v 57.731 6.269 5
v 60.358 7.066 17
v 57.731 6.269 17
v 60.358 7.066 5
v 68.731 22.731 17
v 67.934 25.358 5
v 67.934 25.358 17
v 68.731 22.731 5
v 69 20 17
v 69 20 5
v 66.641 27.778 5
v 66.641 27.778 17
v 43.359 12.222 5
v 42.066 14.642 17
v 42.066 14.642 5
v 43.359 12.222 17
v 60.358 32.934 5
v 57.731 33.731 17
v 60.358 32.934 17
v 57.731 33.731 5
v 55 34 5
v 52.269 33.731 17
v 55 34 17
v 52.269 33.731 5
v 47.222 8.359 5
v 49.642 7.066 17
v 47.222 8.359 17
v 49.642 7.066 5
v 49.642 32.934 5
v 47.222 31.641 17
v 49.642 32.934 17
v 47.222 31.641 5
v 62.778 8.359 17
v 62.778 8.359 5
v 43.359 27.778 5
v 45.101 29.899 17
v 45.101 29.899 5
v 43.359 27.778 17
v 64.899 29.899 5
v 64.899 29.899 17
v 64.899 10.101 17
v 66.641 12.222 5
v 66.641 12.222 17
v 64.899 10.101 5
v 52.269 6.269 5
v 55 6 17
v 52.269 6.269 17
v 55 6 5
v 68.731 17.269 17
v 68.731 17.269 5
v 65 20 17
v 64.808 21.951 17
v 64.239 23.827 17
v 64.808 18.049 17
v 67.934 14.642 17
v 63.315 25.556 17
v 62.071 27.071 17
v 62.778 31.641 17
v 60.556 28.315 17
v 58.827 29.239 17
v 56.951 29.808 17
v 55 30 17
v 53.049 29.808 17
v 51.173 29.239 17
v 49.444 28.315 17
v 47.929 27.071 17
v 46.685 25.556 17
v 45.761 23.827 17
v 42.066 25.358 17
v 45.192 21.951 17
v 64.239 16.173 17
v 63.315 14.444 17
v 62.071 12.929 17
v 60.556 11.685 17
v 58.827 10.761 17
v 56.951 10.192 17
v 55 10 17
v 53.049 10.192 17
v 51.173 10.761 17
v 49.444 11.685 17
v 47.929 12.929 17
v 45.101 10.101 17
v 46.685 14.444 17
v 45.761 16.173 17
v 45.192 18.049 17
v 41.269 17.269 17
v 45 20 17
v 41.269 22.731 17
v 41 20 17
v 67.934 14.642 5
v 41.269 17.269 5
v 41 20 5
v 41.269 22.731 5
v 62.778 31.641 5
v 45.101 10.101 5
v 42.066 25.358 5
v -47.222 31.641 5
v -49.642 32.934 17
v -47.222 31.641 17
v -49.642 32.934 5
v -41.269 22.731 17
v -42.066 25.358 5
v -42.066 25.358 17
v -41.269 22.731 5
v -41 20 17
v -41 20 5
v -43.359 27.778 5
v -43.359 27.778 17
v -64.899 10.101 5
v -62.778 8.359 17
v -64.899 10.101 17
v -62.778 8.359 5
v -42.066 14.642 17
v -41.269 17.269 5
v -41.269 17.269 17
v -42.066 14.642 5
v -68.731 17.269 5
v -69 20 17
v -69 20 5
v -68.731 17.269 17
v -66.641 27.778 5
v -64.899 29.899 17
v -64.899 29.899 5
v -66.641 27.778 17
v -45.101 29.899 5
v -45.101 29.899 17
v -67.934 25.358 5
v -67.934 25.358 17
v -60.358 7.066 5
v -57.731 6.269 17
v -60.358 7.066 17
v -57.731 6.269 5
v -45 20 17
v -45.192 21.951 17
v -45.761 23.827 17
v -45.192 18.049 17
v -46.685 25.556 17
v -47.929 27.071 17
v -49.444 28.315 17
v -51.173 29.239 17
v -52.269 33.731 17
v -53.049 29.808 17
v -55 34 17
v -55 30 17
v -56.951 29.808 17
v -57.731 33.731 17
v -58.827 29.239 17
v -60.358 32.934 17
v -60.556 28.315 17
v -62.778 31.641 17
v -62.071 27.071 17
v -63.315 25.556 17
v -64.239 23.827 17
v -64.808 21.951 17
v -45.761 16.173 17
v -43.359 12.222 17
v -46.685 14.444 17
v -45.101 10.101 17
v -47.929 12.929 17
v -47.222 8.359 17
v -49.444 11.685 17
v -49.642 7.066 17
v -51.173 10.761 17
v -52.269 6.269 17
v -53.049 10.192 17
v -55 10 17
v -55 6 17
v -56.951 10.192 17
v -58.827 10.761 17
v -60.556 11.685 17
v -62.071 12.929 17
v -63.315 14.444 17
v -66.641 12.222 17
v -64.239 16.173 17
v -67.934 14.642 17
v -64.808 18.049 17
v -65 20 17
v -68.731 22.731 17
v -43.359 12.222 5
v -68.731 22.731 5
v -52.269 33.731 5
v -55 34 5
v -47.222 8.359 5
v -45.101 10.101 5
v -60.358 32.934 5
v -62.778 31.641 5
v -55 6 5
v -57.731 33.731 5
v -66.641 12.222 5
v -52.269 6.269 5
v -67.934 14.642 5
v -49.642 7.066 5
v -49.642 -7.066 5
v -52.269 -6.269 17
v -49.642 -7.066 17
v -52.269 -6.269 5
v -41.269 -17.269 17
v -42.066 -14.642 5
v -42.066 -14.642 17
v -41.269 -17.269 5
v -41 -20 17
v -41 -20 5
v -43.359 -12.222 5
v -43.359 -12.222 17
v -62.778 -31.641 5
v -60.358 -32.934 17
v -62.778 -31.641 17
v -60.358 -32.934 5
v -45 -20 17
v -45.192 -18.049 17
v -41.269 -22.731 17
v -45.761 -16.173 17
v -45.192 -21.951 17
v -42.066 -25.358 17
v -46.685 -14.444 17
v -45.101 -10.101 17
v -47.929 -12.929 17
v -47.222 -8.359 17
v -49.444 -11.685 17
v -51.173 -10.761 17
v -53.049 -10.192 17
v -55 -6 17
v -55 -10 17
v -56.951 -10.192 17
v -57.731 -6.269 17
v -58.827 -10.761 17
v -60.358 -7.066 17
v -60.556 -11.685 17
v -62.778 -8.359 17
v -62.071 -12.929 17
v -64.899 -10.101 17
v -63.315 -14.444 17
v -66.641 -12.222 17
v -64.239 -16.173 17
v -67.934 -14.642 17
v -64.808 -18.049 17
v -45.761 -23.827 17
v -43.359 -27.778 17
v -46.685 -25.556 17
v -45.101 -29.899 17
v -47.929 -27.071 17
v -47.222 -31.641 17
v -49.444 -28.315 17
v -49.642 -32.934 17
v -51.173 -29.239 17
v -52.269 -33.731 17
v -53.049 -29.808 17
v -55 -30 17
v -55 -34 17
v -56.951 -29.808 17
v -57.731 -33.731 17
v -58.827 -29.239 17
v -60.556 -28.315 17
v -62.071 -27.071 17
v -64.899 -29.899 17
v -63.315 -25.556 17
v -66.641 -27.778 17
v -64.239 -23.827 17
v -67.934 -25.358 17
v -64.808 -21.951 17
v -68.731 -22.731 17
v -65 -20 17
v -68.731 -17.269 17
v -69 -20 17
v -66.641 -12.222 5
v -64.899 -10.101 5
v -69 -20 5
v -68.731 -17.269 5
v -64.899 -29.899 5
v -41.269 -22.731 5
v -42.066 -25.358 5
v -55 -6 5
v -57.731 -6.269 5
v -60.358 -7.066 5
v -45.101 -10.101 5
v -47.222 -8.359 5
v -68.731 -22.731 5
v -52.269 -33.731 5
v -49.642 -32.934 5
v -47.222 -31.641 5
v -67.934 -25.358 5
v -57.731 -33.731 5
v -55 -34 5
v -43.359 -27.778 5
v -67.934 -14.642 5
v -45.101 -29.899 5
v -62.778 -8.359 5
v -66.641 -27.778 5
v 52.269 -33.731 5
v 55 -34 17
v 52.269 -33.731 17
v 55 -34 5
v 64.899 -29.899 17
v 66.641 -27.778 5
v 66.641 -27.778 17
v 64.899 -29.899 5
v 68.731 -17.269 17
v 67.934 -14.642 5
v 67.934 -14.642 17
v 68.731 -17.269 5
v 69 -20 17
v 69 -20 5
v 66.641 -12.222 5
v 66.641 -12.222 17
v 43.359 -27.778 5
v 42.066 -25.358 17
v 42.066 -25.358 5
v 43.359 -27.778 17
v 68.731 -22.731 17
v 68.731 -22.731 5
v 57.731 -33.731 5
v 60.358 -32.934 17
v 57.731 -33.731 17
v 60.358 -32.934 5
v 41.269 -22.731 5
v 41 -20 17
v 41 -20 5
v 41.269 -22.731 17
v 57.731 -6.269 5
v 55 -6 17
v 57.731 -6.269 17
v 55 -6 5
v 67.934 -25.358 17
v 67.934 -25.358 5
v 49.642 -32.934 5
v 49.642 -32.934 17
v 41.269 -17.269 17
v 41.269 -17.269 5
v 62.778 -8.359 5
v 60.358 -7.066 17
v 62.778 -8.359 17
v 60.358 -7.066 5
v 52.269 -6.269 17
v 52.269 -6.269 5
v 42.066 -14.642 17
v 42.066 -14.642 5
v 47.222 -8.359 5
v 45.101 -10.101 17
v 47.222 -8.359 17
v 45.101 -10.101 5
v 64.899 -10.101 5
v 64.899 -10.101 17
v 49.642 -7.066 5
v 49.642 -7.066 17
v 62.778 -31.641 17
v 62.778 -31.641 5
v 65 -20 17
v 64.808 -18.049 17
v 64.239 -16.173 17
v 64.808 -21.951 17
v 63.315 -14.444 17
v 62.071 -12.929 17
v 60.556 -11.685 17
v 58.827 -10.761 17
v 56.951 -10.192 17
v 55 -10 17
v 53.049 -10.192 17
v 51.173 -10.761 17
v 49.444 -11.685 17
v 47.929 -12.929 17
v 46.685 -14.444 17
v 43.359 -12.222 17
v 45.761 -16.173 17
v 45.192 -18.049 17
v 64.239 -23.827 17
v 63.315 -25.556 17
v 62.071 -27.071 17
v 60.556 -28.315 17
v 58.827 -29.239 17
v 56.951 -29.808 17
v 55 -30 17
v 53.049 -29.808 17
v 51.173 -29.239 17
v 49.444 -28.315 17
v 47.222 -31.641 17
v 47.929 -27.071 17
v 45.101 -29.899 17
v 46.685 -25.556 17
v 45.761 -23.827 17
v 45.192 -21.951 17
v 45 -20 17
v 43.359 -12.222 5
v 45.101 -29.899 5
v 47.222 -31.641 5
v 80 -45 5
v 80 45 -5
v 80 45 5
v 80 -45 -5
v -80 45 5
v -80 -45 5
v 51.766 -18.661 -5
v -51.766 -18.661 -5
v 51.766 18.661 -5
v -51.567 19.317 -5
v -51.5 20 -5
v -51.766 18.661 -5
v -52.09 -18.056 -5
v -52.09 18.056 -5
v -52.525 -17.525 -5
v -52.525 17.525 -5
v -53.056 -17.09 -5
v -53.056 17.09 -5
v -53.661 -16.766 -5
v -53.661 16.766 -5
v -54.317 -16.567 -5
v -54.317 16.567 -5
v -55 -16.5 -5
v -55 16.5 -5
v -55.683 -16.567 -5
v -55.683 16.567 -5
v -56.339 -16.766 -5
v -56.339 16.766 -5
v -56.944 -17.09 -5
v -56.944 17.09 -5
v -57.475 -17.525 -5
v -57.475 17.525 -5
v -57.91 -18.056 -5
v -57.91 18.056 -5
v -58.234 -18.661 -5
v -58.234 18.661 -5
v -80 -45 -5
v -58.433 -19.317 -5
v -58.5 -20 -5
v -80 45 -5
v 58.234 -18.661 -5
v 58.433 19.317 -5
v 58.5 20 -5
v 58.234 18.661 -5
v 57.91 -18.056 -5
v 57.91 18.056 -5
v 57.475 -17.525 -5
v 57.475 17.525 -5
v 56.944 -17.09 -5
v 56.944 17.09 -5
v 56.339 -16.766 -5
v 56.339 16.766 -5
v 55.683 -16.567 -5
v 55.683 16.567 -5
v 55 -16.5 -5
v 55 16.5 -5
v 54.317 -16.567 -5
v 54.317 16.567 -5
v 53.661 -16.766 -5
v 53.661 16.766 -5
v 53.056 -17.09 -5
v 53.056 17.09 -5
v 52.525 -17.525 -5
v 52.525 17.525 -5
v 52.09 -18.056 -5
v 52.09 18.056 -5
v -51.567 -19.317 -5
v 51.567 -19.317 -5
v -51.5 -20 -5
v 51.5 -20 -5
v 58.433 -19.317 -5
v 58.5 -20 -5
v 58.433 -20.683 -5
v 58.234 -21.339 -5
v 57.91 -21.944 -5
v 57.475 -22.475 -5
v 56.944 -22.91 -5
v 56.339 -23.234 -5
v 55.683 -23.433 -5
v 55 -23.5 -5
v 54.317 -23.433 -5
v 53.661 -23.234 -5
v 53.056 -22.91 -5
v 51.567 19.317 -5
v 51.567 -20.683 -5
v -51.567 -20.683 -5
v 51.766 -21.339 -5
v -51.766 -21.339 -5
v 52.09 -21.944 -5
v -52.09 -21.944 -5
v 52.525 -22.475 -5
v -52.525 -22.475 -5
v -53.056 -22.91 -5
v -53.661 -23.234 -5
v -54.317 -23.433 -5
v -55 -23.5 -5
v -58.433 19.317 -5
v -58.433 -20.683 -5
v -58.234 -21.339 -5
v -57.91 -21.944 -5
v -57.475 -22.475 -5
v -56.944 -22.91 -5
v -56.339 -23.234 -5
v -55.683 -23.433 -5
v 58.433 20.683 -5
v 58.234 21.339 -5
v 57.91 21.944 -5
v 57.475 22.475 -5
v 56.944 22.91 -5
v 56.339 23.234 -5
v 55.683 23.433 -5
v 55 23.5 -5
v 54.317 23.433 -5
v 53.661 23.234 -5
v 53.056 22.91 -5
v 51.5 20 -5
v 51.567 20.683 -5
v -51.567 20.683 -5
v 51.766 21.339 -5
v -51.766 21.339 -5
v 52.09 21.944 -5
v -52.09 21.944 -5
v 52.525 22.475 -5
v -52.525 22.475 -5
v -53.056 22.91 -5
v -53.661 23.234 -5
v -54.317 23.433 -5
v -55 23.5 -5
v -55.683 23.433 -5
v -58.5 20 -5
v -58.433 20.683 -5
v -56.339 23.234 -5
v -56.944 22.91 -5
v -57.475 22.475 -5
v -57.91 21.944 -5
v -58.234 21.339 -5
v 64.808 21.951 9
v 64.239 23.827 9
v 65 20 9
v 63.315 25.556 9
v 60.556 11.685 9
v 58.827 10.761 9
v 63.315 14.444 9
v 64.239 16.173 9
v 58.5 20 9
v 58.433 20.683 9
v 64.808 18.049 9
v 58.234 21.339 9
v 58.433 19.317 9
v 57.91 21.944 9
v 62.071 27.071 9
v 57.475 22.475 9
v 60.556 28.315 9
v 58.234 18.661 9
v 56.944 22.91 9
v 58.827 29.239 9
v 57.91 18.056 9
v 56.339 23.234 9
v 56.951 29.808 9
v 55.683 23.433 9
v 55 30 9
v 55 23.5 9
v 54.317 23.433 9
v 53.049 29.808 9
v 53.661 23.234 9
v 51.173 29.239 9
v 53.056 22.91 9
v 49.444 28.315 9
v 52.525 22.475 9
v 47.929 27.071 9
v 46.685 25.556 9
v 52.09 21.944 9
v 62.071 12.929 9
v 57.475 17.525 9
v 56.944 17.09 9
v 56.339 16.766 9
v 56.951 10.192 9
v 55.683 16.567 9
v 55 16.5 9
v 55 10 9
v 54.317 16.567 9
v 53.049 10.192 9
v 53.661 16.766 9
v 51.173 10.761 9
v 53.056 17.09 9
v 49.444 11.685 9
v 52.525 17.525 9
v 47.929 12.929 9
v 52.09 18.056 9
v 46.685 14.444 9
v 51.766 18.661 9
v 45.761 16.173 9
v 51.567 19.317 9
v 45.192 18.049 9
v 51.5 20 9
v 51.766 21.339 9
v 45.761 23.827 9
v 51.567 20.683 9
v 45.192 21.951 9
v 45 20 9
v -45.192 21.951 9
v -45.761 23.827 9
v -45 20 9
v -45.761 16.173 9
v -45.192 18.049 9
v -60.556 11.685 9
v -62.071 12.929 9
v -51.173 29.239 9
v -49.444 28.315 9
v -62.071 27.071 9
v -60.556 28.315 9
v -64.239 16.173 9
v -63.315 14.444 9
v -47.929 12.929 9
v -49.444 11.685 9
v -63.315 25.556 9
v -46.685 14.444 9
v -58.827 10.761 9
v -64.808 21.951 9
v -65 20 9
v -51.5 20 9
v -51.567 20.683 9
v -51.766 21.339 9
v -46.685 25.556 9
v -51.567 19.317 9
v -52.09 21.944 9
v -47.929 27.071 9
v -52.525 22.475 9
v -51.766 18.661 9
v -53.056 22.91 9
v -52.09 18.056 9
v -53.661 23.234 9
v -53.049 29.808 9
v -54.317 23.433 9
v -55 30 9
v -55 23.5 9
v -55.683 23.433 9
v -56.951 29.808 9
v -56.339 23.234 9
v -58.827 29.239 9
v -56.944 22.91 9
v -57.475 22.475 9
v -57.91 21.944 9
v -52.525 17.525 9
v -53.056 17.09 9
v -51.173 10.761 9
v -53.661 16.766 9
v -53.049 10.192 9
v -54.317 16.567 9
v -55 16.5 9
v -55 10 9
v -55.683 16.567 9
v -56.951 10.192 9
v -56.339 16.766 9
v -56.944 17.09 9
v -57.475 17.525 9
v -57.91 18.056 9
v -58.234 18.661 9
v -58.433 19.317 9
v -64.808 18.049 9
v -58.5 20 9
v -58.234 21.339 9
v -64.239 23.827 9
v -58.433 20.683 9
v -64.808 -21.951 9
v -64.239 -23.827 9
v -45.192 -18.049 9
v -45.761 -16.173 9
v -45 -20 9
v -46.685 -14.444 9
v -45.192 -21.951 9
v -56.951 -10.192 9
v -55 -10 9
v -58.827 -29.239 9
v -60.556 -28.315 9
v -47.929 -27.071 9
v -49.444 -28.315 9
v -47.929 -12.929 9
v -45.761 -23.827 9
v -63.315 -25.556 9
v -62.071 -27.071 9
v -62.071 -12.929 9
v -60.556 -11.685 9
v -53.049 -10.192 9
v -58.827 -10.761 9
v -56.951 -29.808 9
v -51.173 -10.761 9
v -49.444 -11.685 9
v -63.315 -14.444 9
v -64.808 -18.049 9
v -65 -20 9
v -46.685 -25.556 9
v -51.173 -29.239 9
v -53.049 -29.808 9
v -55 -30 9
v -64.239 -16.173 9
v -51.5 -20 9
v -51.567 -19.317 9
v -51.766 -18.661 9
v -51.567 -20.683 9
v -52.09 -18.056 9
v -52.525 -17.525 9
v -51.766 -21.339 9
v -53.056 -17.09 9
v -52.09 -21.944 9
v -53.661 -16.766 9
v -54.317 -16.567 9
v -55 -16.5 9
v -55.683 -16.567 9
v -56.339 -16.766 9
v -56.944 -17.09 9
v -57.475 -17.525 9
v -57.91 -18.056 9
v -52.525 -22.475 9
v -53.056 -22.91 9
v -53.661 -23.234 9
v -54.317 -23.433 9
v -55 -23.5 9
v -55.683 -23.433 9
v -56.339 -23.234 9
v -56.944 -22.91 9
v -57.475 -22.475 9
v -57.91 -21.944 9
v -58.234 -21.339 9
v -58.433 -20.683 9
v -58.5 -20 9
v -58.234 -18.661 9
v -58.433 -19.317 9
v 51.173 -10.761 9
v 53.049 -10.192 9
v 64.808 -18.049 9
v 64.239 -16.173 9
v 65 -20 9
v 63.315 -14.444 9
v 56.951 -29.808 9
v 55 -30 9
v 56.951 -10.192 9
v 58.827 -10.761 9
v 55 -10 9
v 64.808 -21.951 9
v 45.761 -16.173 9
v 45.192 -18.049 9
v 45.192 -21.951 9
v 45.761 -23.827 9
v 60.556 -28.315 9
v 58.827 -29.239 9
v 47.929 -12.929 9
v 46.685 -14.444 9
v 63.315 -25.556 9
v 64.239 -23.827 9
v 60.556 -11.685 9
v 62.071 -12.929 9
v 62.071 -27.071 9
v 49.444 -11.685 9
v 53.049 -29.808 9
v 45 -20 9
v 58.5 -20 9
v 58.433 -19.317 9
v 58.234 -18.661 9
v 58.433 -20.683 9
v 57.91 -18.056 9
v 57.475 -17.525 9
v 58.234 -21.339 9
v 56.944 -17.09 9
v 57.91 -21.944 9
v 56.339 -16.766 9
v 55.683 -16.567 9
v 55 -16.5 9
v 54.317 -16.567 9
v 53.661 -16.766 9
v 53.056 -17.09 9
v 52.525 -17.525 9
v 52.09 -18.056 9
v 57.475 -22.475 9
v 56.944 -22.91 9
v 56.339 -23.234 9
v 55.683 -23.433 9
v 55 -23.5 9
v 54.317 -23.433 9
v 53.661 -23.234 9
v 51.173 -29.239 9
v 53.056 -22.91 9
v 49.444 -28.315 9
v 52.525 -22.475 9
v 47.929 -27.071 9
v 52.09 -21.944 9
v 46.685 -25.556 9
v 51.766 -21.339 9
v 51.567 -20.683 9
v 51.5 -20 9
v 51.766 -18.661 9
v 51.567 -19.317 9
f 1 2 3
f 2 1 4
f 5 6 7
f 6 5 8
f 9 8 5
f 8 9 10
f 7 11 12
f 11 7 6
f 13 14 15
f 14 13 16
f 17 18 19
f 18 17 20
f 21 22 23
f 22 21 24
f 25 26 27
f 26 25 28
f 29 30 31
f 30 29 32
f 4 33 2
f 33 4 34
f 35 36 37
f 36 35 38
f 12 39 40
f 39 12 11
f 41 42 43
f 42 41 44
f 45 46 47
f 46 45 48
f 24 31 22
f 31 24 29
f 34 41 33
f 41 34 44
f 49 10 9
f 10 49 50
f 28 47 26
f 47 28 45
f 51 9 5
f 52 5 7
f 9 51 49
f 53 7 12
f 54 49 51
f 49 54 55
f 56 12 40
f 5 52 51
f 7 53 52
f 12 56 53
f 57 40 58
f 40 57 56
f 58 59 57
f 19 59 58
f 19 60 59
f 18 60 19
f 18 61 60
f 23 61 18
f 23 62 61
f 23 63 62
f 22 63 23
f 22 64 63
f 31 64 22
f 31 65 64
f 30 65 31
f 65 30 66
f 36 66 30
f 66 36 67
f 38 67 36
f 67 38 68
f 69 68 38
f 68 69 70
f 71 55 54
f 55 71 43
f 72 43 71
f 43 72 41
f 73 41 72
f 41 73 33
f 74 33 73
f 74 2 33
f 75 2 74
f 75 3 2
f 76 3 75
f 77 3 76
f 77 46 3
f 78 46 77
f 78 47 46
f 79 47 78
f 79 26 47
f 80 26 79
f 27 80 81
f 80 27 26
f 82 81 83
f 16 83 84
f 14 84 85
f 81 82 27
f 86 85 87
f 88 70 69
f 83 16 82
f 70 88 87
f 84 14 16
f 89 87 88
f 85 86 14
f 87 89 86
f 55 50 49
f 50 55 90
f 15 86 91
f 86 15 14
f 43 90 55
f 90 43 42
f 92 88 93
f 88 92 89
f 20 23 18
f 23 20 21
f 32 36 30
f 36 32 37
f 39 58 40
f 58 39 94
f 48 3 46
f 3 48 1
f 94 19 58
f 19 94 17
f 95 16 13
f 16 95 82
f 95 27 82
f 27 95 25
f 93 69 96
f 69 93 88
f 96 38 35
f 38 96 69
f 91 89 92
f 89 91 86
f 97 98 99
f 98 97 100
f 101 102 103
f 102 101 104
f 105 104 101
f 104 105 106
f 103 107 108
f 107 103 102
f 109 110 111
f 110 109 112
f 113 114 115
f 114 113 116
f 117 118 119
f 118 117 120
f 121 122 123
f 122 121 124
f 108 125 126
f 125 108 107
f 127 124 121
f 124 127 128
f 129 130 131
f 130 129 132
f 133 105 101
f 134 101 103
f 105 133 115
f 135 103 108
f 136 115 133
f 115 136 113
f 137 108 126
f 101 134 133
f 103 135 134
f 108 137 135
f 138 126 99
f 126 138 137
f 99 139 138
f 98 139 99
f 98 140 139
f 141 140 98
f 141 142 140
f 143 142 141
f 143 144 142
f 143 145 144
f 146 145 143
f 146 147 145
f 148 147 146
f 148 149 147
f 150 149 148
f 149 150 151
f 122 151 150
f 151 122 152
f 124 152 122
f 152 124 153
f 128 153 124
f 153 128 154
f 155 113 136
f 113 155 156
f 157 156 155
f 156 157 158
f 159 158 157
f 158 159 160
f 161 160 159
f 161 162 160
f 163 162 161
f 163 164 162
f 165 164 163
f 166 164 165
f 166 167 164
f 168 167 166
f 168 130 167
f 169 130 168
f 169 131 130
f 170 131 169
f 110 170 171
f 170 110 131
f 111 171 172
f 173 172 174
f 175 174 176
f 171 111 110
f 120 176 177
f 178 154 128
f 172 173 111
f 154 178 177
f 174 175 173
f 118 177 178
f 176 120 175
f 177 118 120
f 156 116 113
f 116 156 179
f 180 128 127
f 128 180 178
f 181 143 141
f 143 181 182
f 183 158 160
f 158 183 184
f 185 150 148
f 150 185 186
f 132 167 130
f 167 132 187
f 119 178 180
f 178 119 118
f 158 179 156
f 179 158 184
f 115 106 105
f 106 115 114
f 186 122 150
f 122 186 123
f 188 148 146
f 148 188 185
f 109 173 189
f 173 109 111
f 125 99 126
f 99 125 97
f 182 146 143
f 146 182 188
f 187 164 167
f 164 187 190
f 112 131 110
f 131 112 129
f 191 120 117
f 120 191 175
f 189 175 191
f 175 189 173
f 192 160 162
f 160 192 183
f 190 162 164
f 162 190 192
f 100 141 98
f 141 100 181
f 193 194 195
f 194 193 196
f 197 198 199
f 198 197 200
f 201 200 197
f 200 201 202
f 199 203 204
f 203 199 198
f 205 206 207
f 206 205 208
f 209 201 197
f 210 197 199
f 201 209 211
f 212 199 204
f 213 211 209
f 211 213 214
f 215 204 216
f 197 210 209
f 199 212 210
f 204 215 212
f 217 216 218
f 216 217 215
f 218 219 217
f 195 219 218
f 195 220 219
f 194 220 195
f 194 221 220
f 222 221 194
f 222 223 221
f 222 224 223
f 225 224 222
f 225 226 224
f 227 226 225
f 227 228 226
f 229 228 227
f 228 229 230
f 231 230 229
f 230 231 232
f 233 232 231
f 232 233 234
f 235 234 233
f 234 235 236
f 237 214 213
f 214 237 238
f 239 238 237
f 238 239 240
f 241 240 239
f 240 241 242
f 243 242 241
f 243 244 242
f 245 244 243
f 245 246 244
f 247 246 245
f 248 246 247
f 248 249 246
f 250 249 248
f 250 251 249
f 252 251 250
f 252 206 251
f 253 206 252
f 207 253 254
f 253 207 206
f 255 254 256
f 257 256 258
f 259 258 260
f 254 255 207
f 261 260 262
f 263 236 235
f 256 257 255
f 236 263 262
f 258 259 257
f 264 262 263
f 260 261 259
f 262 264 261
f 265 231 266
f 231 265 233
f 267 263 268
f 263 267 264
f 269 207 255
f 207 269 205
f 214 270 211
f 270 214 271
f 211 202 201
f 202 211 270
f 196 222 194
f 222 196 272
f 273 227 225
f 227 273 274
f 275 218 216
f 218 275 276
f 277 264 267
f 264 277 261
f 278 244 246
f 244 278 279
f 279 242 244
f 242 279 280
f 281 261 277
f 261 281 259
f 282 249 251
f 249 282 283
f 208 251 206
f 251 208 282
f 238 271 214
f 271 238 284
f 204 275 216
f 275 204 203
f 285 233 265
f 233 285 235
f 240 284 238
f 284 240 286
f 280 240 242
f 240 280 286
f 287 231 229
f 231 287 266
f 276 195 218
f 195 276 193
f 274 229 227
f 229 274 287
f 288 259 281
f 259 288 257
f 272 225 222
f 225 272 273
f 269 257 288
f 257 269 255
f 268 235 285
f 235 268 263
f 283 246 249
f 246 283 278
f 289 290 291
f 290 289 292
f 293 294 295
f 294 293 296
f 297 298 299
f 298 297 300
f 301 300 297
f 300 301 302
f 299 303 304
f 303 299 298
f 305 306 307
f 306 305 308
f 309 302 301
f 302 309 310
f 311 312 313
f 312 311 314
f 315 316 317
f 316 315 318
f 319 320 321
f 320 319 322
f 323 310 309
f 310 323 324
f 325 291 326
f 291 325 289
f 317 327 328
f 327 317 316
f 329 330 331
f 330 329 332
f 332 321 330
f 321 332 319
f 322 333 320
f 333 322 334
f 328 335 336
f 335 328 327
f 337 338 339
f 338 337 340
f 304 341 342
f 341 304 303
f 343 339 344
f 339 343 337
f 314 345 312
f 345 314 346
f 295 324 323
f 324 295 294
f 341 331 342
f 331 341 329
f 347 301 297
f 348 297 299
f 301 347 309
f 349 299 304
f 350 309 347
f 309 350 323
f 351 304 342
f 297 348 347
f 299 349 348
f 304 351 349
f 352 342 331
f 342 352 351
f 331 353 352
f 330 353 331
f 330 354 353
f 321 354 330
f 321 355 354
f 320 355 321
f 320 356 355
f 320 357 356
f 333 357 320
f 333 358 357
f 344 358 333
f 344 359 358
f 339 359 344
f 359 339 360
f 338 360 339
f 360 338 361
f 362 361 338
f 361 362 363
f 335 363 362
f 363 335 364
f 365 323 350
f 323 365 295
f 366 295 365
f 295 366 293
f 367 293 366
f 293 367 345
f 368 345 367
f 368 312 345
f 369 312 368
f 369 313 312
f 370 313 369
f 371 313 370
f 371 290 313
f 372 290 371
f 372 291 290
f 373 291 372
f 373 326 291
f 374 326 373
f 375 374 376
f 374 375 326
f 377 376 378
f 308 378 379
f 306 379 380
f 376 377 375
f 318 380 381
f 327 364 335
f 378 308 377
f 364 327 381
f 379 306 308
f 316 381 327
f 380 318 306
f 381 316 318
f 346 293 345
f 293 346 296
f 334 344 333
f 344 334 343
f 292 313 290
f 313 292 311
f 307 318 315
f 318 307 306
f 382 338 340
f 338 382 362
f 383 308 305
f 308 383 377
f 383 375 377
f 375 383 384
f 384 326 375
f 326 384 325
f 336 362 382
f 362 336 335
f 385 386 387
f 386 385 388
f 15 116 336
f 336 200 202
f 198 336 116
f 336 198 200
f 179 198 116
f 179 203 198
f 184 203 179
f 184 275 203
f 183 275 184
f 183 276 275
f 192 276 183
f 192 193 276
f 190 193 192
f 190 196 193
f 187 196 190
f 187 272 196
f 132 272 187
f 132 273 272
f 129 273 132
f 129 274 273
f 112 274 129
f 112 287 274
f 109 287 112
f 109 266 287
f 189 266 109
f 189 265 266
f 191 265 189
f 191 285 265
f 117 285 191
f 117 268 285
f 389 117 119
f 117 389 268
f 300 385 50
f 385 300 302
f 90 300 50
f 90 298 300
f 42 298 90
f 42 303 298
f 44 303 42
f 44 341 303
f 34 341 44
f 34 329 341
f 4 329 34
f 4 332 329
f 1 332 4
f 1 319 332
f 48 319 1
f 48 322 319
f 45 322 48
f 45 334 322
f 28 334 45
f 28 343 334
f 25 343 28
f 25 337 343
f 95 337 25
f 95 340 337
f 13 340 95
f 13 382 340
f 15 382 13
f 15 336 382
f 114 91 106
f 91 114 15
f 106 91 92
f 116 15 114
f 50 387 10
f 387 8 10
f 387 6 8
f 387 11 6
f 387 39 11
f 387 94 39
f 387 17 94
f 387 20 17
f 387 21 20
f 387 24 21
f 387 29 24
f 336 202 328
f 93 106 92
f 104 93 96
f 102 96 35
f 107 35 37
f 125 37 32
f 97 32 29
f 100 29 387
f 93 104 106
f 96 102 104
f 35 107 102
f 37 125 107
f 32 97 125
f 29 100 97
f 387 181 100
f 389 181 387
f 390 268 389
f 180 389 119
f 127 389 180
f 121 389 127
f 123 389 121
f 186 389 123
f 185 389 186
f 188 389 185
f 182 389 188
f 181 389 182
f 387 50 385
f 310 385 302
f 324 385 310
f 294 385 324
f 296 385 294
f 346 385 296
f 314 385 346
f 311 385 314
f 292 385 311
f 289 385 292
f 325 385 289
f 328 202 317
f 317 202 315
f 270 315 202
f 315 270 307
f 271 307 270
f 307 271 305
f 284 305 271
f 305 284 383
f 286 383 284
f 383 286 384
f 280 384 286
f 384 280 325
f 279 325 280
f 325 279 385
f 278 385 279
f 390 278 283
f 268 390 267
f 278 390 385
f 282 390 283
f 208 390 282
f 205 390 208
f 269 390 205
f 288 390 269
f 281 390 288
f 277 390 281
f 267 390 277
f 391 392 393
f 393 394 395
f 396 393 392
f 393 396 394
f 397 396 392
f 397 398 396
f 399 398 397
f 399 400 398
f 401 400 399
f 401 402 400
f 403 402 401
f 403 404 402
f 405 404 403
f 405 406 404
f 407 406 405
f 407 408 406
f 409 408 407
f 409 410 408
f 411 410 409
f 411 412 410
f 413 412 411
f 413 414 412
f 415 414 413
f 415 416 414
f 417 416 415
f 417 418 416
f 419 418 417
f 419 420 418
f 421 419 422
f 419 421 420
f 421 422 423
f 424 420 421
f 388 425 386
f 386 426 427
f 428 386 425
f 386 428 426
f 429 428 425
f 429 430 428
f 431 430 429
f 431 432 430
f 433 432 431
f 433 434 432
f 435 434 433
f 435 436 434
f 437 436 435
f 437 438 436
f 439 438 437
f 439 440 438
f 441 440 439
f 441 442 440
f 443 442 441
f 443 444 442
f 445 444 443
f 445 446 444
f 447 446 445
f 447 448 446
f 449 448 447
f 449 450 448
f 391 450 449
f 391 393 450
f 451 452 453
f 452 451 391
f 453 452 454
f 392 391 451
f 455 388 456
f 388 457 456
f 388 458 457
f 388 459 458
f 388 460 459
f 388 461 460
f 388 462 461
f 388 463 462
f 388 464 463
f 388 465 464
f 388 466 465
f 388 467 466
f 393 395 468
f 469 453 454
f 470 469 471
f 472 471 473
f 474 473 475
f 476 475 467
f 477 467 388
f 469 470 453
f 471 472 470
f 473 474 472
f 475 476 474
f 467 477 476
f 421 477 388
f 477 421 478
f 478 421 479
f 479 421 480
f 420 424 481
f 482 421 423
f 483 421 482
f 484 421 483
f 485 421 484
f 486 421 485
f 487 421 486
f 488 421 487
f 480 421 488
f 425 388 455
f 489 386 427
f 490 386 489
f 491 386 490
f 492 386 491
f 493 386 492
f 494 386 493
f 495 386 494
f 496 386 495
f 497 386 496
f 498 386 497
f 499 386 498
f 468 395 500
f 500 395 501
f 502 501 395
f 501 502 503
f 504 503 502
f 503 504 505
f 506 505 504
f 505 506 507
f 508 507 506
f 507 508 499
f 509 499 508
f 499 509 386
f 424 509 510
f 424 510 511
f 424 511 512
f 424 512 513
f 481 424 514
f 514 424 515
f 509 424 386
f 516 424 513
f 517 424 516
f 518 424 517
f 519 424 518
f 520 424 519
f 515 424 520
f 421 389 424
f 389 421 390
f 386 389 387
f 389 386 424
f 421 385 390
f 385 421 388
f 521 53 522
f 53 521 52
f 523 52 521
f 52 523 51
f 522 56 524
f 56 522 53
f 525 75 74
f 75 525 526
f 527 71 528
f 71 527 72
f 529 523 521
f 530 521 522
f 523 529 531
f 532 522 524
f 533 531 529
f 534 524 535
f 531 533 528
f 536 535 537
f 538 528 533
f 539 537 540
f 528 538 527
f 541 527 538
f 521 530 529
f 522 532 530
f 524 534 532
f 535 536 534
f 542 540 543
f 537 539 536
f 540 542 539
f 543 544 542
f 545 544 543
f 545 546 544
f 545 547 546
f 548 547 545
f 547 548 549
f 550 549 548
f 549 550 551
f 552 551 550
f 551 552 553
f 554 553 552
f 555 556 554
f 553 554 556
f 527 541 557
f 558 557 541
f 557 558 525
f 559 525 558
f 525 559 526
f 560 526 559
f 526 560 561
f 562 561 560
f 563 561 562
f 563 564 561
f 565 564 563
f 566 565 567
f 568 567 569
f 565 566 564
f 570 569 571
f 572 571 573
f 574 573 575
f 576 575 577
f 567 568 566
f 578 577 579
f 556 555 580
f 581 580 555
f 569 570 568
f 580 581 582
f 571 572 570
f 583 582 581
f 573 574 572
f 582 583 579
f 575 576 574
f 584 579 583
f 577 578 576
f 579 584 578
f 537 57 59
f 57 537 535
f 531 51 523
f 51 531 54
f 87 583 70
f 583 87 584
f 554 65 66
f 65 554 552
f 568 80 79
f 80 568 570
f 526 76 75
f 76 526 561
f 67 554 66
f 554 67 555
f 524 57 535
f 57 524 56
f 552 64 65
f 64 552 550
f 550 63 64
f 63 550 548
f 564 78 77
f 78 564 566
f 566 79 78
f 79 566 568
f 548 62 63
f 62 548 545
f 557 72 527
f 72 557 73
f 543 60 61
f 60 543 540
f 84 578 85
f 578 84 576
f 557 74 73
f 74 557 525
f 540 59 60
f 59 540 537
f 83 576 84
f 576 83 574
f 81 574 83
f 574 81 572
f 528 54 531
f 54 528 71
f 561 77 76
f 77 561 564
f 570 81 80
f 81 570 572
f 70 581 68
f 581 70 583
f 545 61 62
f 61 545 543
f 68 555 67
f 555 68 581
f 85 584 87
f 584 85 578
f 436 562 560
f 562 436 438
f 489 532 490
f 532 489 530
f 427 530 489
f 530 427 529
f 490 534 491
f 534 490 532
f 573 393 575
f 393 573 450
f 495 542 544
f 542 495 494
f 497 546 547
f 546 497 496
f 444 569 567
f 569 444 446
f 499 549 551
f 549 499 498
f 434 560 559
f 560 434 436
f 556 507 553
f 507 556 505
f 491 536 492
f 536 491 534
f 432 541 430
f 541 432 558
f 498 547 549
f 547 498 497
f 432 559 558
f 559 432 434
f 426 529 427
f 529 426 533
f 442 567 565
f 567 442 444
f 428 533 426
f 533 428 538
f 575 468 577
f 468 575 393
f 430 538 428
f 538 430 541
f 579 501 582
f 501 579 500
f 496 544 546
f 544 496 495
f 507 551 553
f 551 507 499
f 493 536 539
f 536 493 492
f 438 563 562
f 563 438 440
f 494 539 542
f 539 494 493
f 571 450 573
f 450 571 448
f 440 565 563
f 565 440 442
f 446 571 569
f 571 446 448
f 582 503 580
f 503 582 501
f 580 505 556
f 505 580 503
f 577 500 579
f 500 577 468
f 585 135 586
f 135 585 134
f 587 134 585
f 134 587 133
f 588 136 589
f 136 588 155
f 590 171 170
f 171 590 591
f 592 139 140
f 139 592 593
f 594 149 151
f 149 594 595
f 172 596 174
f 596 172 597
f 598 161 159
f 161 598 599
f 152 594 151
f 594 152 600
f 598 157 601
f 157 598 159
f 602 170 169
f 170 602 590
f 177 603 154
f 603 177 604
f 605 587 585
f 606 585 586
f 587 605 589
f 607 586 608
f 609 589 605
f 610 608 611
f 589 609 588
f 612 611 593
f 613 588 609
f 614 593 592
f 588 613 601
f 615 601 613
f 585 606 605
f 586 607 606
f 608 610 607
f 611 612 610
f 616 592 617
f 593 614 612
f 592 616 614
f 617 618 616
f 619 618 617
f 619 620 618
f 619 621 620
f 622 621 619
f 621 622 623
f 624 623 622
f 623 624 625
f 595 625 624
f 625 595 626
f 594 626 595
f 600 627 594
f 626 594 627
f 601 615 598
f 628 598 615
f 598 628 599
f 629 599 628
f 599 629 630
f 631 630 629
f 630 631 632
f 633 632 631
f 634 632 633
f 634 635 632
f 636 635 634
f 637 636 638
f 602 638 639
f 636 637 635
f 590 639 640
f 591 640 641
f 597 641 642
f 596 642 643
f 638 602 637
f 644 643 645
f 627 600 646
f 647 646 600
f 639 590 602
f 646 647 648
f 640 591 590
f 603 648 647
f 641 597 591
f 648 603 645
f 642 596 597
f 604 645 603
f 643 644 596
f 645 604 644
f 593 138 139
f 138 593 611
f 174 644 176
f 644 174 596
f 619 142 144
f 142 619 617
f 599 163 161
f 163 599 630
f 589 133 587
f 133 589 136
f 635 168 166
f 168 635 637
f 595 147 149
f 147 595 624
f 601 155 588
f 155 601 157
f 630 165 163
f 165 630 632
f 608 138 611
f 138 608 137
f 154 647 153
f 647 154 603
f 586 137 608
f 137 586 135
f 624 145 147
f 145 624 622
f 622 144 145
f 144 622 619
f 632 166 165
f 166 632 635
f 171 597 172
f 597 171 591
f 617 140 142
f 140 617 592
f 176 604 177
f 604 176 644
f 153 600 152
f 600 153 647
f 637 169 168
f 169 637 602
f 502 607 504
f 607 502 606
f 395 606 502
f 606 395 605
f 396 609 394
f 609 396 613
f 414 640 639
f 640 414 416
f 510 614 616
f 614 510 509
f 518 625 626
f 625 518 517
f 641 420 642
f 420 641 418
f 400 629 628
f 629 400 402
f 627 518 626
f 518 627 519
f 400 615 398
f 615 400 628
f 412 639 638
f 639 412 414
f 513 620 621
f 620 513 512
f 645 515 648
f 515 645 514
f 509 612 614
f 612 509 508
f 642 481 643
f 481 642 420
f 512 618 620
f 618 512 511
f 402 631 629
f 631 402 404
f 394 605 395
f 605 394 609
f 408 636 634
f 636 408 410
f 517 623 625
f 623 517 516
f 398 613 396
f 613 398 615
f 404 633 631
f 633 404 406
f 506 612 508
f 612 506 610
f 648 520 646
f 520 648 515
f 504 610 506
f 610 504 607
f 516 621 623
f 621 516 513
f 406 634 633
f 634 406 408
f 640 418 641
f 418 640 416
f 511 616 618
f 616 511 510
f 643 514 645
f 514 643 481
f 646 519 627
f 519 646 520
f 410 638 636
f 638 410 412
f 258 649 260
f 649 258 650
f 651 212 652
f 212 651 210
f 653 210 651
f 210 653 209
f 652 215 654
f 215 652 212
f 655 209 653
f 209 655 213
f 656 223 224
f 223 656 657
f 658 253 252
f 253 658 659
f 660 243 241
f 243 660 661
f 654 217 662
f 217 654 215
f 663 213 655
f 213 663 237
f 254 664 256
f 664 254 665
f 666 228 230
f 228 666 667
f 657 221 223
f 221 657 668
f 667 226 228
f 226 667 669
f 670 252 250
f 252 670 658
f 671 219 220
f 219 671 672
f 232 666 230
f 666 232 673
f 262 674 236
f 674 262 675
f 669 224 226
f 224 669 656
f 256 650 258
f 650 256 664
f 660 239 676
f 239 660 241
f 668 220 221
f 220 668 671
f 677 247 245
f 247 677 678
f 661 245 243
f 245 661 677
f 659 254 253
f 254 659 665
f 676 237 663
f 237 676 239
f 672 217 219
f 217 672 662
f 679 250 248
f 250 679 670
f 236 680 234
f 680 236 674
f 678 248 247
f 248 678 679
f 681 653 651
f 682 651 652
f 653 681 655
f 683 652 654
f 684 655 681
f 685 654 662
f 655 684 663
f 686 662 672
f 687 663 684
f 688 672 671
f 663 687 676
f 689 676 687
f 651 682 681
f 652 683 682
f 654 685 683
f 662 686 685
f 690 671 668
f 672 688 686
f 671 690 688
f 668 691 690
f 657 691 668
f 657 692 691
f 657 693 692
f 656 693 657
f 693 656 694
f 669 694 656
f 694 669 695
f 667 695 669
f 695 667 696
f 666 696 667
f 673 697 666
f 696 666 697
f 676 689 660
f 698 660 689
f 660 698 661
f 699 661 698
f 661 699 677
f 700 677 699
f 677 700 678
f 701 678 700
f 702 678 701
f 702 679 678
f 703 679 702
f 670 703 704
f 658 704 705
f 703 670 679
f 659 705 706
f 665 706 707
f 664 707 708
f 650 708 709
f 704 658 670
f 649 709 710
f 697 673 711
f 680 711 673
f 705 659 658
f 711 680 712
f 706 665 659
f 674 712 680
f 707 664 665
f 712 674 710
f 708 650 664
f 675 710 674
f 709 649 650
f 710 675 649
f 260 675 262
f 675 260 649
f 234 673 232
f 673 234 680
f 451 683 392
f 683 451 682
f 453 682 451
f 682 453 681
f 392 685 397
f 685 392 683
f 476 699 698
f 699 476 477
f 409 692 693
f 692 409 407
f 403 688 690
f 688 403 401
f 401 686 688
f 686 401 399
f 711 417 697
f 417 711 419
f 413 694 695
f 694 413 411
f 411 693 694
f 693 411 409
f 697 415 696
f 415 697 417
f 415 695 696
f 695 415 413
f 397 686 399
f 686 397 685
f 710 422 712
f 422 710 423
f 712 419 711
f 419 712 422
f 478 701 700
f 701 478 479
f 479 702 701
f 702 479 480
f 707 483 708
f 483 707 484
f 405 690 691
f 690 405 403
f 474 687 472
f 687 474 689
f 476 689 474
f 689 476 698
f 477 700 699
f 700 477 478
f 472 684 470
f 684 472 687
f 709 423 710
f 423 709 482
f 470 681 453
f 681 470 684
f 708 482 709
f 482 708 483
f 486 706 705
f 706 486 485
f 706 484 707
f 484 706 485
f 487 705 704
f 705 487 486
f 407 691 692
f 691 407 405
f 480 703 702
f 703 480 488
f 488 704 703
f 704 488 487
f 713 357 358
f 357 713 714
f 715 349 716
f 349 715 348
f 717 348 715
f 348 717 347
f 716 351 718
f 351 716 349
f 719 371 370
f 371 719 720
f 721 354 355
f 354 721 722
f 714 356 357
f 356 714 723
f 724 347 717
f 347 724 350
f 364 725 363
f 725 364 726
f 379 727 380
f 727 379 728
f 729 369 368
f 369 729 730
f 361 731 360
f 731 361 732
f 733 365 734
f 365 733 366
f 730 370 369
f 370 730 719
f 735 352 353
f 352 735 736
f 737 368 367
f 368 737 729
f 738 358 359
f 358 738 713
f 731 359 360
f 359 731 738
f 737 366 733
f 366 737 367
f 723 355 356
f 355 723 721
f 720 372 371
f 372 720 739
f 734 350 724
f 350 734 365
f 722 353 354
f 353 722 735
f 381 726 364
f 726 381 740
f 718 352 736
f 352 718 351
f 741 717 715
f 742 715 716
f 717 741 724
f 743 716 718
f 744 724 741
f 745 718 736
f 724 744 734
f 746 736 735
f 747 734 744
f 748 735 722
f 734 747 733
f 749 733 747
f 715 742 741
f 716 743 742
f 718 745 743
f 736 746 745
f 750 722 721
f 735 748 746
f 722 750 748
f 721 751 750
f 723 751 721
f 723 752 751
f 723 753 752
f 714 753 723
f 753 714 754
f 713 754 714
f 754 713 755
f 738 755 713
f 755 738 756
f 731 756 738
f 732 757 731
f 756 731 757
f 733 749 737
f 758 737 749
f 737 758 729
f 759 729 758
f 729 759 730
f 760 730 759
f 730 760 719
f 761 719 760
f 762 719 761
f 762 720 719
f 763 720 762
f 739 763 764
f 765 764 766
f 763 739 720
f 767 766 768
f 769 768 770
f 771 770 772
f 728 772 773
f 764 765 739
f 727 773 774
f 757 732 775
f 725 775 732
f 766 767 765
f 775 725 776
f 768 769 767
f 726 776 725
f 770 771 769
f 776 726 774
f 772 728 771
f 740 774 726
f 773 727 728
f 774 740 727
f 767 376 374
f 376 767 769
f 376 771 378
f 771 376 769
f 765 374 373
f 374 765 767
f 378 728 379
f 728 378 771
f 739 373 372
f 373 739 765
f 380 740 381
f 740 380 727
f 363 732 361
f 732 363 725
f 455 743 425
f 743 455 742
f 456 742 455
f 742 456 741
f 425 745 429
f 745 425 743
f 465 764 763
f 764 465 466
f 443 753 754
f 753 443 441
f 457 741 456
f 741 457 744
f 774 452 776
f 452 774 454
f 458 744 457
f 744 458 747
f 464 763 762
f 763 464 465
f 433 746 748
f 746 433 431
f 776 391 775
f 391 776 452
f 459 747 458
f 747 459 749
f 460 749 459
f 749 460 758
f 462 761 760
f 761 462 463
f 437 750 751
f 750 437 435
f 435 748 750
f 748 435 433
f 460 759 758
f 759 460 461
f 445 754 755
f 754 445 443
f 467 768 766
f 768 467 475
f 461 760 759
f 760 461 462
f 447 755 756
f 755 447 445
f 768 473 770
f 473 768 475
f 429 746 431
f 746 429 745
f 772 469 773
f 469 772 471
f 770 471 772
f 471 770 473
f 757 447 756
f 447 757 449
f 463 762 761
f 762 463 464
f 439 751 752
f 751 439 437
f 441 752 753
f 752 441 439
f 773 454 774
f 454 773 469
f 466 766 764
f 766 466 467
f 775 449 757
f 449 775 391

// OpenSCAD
$fn = 32;

// ----------------------------------------------------------------------
// Socket pad plate
// bosses with counterbored sockets for the screws
// ----------------------------------------------------------------------

// --- parameters (mm) ---
base_t = 10;            // base plate thickness
boss_h = 12;            // boss height above the base plate
boss_d = 28;            // boss diameter
socket_d = 20;          // socket diameter
socket_depth = 8;       // socket depth from the boss face
bolt_d = 7;             // screw clearance hole through the socket floor
plate = [160, 90, 10];  // overall size (x, y, z)
edge = 25;              // boss centre offset from the plate edge
pads = 4;               // boss count, one per corner

// --- derived feature positions (mm) ---
height = base_t + boss_h;        // = 22   overall height of the part
corner_x = plate[0] / 2 - edge;  // = 55   boss centre X
corner_y = plate[1] / 2 - edge;  // = 20   boss centre Y
feature_centers = [
  [corner_x, corner_y],
  [-corner_x, corner_y],
  [-corner_x, -corner_y],
  [corner_x, -corner_y]
];   // boss centres: sockets, holes and the pads themselves are placed from here

// base plate, bosses on feature_centers, socket + through hole in each
difference() {
  union() {
    cube(plate, center = true);
    for (centre = feature_centers)
      translate([centre[0], centre[1], plate[2] / 2 - 1])
        cylinder(d = boss_d, h = boss_h + 1);
  }
  for (centre = feature_centers) {
    translate([centre[0], centre[1], plate[2] / 2 + boss_h - socket_depth])
      cylinder(d = socket_d, h = socket_depth + 1);
    translate([centre[0], centre[1], -height])
      cylinder(d = bolt_d, h = 2 * height + 2);  // through the socket floor
  }
}
